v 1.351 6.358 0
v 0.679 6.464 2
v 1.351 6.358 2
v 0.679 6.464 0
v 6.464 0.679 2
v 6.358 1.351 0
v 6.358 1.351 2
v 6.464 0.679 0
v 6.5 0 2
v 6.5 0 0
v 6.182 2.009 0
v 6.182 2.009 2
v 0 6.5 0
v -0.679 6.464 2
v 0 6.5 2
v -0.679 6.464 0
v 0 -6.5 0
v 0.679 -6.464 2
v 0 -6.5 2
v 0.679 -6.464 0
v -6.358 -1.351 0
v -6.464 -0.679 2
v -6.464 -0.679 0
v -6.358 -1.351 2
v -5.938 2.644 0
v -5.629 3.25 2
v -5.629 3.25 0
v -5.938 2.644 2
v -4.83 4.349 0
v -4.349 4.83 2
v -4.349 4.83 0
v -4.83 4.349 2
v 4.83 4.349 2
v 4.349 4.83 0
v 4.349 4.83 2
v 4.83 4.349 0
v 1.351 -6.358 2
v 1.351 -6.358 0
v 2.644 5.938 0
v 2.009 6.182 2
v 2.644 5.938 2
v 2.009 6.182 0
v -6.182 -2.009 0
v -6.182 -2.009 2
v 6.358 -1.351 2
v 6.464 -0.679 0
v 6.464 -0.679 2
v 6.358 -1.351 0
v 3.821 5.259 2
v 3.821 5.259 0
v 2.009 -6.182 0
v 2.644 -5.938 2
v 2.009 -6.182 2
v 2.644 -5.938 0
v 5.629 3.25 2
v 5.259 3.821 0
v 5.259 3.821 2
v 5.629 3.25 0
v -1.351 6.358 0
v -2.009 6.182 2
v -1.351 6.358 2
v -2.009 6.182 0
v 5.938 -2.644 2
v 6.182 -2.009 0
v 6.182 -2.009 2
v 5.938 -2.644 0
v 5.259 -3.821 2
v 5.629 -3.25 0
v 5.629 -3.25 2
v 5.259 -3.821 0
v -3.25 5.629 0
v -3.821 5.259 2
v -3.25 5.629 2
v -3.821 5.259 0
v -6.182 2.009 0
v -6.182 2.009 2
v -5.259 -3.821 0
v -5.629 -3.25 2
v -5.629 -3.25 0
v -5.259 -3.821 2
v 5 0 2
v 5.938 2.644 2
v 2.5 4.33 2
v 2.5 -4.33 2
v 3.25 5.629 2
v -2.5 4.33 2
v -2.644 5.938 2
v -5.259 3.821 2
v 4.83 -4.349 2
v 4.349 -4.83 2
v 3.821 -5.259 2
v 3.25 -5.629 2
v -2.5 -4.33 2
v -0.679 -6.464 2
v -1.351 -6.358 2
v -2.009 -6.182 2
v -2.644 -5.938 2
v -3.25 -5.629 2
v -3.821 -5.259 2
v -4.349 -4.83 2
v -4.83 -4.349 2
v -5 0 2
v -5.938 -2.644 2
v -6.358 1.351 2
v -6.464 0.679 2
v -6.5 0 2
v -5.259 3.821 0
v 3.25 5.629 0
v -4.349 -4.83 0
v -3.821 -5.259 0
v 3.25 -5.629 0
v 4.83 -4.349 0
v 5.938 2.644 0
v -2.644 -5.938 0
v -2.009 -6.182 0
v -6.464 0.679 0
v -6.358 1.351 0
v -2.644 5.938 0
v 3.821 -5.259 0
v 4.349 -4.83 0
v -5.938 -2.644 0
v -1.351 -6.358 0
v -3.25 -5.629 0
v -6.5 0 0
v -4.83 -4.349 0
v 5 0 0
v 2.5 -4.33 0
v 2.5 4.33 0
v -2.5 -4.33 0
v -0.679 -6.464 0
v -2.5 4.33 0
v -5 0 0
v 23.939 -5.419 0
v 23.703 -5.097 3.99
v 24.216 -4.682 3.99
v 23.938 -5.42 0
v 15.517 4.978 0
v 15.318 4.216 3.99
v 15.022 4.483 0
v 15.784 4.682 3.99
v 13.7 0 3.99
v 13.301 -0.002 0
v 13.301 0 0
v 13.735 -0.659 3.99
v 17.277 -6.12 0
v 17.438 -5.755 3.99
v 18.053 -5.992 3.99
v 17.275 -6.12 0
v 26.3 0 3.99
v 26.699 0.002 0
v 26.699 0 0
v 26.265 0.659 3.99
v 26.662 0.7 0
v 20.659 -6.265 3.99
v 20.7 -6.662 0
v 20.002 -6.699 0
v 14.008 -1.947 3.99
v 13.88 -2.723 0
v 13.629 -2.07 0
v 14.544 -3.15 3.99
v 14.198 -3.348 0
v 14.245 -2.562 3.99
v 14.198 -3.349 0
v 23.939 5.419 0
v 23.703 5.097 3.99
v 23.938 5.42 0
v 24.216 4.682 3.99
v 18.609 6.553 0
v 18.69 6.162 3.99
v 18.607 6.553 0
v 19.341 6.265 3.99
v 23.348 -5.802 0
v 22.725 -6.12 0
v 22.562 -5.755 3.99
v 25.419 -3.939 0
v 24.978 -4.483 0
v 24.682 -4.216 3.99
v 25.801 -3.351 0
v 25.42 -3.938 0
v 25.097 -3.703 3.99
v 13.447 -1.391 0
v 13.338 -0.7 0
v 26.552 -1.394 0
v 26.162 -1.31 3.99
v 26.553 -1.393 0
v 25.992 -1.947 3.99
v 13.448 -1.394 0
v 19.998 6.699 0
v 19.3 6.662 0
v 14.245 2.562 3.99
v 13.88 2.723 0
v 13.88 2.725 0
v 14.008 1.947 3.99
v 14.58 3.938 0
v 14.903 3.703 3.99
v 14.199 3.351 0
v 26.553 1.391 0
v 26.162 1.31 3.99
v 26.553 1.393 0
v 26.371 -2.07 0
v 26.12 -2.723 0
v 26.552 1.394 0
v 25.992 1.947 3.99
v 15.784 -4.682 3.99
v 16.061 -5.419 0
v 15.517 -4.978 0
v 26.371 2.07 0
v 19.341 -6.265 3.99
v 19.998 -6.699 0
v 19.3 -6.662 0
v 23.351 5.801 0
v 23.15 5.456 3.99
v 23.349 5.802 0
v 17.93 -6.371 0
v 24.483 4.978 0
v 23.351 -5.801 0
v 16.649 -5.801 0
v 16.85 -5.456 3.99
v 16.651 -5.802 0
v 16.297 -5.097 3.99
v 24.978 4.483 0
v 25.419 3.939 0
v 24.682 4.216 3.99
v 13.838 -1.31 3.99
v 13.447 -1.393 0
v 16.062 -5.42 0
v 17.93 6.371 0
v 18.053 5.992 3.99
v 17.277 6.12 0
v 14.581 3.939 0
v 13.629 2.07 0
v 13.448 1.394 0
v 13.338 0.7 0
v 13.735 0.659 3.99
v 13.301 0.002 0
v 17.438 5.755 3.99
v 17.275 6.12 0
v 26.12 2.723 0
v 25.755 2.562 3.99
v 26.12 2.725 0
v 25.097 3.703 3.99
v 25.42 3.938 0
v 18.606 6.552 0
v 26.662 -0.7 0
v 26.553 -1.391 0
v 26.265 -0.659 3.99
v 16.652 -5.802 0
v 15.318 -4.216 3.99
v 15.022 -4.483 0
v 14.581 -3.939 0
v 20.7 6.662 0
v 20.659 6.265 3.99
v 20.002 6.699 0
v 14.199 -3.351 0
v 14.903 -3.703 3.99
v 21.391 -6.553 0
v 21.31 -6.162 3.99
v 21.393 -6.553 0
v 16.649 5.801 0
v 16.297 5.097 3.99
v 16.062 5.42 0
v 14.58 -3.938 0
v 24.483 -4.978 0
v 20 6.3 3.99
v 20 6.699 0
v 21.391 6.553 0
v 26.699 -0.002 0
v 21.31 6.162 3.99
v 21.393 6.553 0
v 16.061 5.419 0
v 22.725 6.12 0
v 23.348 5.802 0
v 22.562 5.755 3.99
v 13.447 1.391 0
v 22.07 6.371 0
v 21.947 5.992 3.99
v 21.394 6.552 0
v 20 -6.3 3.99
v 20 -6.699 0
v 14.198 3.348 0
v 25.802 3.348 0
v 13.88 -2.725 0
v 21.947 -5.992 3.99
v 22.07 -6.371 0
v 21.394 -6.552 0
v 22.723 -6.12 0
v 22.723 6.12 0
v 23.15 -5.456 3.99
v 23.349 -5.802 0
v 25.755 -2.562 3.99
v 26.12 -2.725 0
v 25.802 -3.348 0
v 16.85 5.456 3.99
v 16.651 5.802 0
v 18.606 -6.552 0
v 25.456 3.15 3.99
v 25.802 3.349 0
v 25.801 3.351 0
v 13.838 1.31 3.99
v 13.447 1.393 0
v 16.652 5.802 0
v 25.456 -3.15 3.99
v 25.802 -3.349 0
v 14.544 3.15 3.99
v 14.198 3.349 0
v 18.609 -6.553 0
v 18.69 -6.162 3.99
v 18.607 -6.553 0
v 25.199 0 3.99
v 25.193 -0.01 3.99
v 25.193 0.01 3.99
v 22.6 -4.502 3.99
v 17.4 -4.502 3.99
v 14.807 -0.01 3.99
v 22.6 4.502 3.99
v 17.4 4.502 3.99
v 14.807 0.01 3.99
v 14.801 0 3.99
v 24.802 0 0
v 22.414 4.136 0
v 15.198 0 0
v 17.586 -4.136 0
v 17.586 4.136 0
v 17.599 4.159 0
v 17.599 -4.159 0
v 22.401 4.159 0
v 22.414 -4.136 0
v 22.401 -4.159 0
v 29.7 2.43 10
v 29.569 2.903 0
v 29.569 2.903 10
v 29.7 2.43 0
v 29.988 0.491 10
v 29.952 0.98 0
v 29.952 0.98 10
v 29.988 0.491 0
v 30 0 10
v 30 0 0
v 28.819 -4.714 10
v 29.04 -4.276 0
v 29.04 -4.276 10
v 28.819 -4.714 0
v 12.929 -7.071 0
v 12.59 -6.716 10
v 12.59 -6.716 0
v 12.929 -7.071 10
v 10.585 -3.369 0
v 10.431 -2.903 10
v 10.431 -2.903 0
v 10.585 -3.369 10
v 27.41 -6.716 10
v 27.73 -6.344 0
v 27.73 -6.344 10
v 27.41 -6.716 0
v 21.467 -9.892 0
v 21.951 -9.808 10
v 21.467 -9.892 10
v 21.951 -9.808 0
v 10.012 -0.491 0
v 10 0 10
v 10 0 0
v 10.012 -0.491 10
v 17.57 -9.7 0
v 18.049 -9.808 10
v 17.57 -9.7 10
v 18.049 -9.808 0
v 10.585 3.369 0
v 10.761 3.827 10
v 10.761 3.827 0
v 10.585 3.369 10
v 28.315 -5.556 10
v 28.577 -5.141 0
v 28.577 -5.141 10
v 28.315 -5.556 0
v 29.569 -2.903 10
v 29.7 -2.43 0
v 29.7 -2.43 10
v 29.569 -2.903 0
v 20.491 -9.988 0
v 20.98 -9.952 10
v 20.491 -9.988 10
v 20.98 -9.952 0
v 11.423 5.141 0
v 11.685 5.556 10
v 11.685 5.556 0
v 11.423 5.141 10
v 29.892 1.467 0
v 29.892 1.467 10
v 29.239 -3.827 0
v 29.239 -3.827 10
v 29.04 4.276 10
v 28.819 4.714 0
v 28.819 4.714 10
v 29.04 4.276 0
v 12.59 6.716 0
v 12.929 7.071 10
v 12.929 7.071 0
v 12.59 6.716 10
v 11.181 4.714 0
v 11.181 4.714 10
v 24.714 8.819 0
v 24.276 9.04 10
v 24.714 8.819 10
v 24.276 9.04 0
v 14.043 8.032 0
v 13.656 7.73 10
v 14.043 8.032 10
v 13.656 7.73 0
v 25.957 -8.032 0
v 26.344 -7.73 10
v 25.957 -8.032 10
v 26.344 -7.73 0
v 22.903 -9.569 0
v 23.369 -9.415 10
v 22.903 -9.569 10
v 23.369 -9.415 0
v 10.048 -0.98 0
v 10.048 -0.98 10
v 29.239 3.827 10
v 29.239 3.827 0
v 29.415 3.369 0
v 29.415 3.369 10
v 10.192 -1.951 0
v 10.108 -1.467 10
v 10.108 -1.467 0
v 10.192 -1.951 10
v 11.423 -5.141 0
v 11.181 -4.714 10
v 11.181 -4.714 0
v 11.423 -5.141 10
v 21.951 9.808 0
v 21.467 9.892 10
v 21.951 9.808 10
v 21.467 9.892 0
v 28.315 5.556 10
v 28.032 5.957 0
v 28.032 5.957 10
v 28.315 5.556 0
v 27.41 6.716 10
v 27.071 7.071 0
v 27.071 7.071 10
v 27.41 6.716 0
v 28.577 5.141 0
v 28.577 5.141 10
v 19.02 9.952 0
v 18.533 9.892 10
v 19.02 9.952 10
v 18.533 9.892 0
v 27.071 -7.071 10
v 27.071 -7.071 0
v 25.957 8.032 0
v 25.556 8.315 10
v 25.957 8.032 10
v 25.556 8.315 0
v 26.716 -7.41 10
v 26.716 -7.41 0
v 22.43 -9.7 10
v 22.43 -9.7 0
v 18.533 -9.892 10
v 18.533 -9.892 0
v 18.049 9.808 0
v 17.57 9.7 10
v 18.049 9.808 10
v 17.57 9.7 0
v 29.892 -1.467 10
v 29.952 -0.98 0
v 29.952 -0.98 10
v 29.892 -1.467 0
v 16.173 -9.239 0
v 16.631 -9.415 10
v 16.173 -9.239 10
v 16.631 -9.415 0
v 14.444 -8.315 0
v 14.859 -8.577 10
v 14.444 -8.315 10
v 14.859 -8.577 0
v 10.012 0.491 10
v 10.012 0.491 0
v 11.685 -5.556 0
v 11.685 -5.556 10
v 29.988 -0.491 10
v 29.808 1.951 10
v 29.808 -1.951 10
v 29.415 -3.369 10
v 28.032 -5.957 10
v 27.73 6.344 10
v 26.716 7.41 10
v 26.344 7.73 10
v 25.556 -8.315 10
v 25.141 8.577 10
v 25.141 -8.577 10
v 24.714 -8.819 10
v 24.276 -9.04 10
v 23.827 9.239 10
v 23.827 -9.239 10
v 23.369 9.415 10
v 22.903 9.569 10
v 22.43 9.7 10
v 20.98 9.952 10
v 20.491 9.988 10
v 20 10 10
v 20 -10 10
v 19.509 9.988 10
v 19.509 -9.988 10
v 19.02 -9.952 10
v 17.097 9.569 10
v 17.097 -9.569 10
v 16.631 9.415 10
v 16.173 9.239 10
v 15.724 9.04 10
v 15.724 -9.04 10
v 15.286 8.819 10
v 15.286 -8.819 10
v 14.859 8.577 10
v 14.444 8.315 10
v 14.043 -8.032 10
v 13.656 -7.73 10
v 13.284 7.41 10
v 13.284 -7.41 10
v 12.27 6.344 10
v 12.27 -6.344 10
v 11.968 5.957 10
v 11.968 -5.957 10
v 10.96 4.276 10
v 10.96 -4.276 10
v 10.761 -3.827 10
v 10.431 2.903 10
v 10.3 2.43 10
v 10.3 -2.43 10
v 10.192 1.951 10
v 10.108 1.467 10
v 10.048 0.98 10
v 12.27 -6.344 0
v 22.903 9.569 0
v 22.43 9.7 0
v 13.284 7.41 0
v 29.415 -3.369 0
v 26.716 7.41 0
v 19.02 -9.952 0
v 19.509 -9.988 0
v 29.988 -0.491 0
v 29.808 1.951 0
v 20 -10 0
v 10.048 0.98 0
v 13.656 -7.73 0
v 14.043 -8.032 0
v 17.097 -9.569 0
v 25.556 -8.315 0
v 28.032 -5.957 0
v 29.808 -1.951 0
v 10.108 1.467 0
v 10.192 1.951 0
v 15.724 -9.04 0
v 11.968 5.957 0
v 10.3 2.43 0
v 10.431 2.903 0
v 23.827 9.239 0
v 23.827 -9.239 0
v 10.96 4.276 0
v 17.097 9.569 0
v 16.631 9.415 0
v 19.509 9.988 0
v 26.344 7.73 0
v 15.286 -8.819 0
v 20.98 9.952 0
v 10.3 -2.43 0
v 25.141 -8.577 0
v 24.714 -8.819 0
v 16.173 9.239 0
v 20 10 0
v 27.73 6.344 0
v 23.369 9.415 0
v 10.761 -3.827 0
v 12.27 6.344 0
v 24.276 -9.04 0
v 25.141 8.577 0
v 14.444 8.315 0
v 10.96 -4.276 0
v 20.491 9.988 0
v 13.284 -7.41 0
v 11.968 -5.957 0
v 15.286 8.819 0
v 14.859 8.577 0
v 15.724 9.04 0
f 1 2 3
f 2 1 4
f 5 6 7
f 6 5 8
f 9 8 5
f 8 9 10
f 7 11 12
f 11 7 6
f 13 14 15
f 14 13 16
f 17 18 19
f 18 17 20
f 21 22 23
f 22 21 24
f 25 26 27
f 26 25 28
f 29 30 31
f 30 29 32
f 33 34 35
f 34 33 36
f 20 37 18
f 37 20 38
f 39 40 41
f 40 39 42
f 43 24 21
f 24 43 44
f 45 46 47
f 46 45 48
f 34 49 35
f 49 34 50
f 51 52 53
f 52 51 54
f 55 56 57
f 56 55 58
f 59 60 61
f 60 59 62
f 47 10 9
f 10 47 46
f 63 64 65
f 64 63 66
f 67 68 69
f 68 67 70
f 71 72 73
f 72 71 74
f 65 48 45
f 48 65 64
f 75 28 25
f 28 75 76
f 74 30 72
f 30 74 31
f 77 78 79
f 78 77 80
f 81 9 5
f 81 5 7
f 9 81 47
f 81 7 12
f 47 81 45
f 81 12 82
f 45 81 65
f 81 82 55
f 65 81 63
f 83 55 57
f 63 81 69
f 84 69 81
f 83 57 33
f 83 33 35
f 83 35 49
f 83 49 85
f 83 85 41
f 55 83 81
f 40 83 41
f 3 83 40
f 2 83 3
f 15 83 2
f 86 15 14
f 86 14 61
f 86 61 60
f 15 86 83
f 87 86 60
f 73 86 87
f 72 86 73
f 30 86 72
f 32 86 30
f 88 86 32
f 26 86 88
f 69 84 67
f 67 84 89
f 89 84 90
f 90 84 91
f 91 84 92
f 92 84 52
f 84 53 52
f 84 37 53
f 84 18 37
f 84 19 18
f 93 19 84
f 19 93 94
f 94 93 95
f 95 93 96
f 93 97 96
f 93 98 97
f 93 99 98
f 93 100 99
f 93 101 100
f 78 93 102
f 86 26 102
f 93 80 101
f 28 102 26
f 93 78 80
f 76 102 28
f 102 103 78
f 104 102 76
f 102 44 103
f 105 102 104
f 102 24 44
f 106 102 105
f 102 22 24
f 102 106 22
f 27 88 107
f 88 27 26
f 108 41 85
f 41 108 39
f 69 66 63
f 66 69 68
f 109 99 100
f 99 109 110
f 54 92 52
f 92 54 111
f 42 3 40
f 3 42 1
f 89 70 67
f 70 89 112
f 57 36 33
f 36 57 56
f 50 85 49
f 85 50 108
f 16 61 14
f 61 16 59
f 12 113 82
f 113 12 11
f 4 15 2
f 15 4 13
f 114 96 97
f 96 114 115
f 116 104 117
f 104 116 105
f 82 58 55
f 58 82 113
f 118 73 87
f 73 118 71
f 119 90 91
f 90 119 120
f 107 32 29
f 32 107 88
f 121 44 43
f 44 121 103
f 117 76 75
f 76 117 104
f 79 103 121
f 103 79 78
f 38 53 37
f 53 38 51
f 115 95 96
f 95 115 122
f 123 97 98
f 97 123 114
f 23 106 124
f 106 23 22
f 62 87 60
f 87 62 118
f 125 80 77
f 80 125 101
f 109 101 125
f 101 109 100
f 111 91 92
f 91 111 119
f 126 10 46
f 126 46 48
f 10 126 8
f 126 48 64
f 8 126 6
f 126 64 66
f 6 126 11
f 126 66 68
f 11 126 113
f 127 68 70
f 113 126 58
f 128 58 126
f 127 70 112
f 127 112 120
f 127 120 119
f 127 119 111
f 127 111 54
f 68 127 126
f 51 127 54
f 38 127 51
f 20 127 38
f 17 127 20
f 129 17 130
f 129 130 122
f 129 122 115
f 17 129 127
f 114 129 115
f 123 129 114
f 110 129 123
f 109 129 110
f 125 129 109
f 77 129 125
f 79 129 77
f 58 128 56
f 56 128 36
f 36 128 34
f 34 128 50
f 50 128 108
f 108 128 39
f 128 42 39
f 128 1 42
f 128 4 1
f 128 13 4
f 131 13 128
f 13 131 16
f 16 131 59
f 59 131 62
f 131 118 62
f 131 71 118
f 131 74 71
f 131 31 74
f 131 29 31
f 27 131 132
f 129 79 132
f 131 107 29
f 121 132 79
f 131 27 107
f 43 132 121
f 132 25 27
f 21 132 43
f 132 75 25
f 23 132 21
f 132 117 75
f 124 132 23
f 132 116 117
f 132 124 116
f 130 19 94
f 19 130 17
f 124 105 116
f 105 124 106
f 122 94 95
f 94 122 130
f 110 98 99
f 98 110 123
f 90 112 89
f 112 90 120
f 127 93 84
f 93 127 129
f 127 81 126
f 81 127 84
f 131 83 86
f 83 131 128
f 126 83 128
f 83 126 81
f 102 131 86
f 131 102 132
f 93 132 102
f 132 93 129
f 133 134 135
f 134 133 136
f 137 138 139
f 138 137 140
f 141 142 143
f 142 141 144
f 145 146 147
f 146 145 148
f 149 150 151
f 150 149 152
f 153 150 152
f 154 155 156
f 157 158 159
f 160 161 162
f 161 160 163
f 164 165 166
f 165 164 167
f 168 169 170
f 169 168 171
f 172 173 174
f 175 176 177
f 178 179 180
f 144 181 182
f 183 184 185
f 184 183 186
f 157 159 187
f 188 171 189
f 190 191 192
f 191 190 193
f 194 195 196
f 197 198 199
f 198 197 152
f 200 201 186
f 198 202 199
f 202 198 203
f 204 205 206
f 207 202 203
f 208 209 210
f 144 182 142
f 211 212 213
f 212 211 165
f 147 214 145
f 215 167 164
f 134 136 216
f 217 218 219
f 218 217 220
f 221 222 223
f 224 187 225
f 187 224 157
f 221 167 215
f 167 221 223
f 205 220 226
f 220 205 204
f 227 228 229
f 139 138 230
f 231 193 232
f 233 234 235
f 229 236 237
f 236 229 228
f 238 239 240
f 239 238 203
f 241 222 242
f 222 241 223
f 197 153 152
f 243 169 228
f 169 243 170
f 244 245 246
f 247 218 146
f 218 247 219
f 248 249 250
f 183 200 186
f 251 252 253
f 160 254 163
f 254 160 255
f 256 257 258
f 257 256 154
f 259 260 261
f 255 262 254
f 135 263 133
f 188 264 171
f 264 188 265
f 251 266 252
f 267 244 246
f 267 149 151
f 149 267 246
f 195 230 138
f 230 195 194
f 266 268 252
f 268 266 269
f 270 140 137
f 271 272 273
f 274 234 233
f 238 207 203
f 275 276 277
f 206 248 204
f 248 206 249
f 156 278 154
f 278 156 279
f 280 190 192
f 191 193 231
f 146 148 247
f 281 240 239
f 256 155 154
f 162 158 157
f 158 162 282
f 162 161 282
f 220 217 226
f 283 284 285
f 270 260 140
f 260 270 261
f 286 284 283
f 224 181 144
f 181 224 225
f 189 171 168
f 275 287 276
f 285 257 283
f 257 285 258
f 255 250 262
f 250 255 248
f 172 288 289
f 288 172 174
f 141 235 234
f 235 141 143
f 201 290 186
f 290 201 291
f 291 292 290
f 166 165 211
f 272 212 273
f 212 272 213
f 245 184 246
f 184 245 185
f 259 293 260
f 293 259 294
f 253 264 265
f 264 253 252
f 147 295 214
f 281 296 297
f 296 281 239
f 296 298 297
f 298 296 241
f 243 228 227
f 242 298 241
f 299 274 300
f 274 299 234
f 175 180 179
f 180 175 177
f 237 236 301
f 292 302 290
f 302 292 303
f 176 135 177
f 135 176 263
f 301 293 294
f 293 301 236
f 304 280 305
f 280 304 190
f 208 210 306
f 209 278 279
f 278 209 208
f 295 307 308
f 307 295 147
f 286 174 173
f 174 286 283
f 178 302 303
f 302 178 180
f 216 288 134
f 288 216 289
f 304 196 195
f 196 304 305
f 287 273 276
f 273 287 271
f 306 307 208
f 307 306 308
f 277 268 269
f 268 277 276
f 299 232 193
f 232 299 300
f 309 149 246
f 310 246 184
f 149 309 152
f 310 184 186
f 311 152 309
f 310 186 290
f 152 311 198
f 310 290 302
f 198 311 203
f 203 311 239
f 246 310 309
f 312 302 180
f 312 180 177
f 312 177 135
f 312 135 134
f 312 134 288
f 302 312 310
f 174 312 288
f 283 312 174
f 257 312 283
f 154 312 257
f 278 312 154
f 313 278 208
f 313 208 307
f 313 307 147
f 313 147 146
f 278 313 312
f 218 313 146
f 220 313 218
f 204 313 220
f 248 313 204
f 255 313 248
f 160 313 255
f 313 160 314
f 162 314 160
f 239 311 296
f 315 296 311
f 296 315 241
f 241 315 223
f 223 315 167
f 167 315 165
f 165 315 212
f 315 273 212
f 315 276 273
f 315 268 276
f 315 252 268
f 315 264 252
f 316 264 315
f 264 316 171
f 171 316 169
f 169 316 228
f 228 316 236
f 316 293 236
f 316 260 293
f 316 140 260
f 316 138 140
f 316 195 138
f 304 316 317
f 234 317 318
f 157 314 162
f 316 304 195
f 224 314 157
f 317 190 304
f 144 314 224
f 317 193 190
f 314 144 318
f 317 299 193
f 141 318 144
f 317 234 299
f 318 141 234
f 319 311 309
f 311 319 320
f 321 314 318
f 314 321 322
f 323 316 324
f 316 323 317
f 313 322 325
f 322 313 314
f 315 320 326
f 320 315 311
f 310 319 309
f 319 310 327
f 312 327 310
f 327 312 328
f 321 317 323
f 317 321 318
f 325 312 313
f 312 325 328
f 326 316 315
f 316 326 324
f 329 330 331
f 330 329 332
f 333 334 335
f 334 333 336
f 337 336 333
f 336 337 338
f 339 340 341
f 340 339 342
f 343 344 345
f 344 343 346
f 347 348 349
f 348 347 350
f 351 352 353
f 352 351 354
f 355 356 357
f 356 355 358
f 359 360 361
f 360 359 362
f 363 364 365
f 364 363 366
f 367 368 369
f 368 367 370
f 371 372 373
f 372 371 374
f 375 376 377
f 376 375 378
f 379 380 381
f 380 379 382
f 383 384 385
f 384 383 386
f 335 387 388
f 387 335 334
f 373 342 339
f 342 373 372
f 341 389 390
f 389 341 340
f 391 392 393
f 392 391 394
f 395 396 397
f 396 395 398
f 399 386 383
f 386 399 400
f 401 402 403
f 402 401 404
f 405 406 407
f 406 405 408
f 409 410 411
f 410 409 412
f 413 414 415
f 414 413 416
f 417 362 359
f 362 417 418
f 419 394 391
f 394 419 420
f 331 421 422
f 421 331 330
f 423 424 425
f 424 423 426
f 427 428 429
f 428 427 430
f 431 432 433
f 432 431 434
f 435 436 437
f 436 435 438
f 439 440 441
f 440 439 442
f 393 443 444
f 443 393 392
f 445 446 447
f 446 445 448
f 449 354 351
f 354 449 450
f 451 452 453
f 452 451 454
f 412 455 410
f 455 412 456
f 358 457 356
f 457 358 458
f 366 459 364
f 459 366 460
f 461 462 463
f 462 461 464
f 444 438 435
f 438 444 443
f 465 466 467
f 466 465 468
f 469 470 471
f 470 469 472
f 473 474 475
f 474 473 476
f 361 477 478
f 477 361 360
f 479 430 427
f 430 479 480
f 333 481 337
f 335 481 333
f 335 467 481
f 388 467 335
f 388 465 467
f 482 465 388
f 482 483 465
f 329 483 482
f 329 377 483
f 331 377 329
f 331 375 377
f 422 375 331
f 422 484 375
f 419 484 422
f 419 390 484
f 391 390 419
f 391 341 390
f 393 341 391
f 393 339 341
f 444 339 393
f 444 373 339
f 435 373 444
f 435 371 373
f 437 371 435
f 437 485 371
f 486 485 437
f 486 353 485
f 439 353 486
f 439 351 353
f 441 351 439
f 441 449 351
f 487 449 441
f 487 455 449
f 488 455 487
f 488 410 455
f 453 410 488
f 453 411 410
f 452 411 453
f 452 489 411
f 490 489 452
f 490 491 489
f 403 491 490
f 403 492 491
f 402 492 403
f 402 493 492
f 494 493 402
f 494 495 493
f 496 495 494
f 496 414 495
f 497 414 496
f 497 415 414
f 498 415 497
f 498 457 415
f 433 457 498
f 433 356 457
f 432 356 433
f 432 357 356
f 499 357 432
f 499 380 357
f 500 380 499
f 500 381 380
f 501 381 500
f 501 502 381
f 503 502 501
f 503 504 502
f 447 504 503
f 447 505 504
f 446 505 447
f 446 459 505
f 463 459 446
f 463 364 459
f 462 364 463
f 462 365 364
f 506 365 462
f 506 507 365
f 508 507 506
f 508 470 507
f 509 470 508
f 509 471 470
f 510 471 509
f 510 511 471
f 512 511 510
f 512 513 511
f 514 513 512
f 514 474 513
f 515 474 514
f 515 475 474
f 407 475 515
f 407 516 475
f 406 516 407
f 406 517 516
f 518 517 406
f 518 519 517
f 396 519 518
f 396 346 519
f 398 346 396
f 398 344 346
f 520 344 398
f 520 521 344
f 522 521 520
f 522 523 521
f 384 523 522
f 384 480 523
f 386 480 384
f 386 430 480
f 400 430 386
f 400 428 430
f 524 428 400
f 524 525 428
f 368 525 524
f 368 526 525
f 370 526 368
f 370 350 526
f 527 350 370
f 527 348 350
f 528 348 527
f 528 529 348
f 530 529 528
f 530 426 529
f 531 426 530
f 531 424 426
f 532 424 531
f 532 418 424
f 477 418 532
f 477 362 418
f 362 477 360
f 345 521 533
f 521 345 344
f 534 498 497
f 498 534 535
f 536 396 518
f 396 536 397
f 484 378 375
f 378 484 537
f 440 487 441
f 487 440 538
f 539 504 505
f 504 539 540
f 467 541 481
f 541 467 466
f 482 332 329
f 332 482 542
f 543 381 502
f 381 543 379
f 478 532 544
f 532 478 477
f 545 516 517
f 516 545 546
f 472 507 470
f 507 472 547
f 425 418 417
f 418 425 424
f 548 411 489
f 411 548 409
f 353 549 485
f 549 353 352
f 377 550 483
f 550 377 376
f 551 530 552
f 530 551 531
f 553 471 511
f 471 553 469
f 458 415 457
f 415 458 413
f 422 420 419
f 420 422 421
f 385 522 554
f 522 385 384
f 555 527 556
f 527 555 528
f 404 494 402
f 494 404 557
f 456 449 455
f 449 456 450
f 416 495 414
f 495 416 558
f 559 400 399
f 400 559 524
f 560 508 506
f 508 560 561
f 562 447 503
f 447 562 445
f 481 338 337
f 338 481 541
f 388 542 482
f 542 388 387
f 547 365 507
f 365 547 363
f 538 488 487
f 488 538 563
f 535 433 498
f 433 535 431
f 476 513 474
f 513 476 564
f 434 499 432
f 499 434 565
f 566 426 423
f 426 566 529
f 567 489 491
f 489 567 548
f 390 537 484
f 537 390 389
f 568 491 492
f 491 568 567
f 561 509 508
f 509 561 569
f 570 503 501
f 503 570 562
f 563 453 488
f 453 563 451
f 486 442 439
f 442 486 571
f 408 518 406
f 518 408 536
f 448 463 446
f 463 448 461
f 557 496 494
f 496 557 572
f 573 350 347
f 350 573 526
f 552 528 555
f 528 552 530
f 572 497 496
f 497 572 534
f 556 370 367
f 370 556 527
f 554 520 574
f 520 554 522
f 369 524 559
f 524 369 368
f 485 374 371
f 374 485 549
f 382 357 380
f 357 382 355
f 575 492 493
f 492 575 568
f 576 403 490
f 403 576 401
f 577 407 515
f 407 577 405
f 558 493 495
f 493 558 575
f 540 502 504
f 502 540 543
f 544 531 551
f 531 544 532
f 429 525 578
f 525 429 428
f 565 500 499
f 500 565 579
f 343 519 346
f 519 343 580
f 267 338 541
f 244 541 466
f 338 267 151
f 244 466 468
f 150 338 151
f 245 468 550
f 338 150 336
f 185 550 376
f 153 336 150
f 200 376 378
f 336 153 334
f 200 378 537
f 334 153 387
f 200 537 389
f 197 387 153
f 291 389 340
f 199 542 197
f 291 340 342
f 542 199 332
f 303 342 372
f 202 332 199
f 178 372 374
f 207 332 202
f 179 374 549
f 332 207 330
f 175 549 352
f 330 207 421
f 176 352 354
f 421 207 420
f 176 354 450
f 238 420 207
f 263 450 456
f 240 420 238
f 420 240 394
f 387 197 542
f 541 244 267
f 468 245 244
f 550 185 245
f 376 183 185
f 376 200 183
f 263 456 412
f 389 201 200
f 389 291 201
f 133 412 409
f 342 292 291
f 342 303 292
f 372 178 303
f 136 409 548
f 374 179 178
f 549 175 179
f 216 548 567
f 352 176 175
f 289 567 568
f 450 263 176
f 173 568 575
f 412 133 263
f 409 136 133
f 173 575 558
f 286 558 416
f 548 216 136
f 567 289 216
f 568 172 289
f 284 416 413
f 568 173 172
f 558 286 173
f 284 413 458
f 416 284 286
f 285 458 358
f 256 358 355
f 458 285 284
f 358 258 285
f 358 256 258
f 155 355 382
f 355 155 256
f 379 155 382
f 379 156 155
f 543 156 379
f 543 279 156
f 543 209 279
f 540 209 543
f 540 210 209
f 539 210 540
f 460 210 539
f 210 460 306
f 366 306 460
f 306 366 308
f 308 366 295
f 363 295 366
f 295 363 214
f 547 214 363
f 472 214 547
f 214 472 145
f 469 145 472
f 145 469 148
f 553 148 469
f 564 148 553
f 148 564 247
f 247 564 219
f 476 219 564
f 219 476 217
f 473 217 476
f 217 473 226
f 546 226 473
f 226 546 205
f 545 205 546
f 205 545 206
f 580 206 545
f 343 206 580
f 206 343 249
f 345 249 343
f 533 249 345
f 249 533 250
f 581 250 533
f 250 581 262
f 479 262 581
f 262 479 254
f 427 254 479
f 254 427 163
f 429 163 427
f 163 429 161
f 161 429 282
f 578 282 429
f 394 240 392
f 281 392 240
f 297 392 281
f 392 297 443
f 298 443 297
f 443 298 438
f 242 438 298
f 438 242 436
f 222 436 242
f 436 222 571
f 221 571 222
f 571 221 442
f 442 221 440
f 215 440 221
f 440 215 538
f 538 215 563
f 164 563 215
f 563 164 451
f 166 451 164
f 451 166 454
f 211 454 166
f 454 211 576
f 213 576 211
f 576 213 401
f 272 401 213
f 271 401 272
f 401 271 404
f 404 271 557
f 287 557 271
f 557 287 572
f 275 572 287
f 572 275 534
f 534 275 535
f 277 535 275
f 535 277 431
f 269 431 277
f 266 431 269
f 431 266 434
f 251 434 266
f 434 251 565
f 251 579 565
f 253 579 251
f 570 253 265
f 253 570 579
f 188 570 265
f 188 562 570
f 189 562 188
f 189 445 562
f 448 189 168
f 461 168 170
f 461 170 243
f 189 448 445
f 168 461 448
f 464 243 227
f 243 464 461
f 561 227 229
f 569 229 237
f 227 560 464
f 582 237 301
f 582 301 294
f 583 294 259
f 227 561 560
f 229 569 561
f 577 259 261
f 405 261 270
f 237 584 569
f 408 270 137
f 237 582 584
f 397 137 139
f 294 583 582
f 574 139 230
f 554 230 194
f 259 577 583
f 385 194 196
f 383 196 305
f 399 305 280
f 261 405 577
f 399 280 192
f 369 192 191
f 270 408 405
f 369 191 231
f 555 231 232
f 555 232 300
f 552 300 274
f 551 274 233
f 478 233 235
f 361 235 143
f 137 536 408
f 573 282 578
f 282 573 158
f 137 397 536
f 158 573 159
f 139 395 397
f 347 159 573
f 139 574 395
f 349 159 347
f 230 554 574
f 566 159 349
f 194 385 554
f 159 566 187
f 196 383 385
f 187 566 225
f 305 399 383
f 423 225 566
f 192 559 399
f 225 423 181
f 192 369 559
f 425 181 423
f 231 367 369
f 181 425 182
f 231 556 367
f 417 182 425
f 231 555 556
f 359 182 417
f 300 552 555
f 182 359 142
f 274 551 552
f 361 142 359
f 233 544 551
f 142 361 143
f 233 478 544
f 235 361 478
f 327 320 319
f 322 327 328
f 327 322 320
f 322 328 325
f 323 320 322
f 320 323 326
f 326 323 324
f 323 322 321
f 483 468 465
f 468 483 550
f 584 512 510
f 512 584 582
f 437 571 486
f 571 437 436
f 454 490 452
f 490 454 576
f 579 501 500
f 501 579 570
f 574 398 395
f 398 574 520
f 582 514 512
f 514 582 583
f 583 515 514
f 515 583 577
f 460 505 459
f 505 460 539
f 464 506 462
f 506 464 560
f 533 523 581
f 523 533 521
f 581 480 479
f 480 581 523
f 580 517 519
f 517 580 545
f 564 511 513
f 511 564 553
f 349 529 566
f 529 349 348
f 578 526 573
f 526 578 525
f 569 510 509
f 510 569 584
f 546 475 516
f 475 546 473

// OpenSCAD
// Makedo Style Hex Head
// By Brian Khuu 2024
// Licence: GNU v3 or higher
module makedoStyleScrewHeadModel(h, tol = 0)
{
    difference()
    {
        cylinder(r1=13/2+tol, r2=13/2-tol, h = h, $fn=60);
        translate([0,0,-0.01])
            cylinder(r1=5-tol, r2=5+tol, h = h+0.02, $fn=6);
    }
}

module makedoStyleScrewHead(h, tol=0)
{
    difference()
    {
        children();
        translate([0,0,-0.01])
            makedoStyleScrewHeadModel(h=h, tol=tol);
    }
}

translate([0,0,0])
    makedoStyleScrewHeadModel(h=2);
    
translate([20,0,0])
    makedoStyleScrewHead(h=4, tol = 0.2)
        cylinder(d=20, h = 10, $fn=128);
        

%cube([5,8,10], center=true);
